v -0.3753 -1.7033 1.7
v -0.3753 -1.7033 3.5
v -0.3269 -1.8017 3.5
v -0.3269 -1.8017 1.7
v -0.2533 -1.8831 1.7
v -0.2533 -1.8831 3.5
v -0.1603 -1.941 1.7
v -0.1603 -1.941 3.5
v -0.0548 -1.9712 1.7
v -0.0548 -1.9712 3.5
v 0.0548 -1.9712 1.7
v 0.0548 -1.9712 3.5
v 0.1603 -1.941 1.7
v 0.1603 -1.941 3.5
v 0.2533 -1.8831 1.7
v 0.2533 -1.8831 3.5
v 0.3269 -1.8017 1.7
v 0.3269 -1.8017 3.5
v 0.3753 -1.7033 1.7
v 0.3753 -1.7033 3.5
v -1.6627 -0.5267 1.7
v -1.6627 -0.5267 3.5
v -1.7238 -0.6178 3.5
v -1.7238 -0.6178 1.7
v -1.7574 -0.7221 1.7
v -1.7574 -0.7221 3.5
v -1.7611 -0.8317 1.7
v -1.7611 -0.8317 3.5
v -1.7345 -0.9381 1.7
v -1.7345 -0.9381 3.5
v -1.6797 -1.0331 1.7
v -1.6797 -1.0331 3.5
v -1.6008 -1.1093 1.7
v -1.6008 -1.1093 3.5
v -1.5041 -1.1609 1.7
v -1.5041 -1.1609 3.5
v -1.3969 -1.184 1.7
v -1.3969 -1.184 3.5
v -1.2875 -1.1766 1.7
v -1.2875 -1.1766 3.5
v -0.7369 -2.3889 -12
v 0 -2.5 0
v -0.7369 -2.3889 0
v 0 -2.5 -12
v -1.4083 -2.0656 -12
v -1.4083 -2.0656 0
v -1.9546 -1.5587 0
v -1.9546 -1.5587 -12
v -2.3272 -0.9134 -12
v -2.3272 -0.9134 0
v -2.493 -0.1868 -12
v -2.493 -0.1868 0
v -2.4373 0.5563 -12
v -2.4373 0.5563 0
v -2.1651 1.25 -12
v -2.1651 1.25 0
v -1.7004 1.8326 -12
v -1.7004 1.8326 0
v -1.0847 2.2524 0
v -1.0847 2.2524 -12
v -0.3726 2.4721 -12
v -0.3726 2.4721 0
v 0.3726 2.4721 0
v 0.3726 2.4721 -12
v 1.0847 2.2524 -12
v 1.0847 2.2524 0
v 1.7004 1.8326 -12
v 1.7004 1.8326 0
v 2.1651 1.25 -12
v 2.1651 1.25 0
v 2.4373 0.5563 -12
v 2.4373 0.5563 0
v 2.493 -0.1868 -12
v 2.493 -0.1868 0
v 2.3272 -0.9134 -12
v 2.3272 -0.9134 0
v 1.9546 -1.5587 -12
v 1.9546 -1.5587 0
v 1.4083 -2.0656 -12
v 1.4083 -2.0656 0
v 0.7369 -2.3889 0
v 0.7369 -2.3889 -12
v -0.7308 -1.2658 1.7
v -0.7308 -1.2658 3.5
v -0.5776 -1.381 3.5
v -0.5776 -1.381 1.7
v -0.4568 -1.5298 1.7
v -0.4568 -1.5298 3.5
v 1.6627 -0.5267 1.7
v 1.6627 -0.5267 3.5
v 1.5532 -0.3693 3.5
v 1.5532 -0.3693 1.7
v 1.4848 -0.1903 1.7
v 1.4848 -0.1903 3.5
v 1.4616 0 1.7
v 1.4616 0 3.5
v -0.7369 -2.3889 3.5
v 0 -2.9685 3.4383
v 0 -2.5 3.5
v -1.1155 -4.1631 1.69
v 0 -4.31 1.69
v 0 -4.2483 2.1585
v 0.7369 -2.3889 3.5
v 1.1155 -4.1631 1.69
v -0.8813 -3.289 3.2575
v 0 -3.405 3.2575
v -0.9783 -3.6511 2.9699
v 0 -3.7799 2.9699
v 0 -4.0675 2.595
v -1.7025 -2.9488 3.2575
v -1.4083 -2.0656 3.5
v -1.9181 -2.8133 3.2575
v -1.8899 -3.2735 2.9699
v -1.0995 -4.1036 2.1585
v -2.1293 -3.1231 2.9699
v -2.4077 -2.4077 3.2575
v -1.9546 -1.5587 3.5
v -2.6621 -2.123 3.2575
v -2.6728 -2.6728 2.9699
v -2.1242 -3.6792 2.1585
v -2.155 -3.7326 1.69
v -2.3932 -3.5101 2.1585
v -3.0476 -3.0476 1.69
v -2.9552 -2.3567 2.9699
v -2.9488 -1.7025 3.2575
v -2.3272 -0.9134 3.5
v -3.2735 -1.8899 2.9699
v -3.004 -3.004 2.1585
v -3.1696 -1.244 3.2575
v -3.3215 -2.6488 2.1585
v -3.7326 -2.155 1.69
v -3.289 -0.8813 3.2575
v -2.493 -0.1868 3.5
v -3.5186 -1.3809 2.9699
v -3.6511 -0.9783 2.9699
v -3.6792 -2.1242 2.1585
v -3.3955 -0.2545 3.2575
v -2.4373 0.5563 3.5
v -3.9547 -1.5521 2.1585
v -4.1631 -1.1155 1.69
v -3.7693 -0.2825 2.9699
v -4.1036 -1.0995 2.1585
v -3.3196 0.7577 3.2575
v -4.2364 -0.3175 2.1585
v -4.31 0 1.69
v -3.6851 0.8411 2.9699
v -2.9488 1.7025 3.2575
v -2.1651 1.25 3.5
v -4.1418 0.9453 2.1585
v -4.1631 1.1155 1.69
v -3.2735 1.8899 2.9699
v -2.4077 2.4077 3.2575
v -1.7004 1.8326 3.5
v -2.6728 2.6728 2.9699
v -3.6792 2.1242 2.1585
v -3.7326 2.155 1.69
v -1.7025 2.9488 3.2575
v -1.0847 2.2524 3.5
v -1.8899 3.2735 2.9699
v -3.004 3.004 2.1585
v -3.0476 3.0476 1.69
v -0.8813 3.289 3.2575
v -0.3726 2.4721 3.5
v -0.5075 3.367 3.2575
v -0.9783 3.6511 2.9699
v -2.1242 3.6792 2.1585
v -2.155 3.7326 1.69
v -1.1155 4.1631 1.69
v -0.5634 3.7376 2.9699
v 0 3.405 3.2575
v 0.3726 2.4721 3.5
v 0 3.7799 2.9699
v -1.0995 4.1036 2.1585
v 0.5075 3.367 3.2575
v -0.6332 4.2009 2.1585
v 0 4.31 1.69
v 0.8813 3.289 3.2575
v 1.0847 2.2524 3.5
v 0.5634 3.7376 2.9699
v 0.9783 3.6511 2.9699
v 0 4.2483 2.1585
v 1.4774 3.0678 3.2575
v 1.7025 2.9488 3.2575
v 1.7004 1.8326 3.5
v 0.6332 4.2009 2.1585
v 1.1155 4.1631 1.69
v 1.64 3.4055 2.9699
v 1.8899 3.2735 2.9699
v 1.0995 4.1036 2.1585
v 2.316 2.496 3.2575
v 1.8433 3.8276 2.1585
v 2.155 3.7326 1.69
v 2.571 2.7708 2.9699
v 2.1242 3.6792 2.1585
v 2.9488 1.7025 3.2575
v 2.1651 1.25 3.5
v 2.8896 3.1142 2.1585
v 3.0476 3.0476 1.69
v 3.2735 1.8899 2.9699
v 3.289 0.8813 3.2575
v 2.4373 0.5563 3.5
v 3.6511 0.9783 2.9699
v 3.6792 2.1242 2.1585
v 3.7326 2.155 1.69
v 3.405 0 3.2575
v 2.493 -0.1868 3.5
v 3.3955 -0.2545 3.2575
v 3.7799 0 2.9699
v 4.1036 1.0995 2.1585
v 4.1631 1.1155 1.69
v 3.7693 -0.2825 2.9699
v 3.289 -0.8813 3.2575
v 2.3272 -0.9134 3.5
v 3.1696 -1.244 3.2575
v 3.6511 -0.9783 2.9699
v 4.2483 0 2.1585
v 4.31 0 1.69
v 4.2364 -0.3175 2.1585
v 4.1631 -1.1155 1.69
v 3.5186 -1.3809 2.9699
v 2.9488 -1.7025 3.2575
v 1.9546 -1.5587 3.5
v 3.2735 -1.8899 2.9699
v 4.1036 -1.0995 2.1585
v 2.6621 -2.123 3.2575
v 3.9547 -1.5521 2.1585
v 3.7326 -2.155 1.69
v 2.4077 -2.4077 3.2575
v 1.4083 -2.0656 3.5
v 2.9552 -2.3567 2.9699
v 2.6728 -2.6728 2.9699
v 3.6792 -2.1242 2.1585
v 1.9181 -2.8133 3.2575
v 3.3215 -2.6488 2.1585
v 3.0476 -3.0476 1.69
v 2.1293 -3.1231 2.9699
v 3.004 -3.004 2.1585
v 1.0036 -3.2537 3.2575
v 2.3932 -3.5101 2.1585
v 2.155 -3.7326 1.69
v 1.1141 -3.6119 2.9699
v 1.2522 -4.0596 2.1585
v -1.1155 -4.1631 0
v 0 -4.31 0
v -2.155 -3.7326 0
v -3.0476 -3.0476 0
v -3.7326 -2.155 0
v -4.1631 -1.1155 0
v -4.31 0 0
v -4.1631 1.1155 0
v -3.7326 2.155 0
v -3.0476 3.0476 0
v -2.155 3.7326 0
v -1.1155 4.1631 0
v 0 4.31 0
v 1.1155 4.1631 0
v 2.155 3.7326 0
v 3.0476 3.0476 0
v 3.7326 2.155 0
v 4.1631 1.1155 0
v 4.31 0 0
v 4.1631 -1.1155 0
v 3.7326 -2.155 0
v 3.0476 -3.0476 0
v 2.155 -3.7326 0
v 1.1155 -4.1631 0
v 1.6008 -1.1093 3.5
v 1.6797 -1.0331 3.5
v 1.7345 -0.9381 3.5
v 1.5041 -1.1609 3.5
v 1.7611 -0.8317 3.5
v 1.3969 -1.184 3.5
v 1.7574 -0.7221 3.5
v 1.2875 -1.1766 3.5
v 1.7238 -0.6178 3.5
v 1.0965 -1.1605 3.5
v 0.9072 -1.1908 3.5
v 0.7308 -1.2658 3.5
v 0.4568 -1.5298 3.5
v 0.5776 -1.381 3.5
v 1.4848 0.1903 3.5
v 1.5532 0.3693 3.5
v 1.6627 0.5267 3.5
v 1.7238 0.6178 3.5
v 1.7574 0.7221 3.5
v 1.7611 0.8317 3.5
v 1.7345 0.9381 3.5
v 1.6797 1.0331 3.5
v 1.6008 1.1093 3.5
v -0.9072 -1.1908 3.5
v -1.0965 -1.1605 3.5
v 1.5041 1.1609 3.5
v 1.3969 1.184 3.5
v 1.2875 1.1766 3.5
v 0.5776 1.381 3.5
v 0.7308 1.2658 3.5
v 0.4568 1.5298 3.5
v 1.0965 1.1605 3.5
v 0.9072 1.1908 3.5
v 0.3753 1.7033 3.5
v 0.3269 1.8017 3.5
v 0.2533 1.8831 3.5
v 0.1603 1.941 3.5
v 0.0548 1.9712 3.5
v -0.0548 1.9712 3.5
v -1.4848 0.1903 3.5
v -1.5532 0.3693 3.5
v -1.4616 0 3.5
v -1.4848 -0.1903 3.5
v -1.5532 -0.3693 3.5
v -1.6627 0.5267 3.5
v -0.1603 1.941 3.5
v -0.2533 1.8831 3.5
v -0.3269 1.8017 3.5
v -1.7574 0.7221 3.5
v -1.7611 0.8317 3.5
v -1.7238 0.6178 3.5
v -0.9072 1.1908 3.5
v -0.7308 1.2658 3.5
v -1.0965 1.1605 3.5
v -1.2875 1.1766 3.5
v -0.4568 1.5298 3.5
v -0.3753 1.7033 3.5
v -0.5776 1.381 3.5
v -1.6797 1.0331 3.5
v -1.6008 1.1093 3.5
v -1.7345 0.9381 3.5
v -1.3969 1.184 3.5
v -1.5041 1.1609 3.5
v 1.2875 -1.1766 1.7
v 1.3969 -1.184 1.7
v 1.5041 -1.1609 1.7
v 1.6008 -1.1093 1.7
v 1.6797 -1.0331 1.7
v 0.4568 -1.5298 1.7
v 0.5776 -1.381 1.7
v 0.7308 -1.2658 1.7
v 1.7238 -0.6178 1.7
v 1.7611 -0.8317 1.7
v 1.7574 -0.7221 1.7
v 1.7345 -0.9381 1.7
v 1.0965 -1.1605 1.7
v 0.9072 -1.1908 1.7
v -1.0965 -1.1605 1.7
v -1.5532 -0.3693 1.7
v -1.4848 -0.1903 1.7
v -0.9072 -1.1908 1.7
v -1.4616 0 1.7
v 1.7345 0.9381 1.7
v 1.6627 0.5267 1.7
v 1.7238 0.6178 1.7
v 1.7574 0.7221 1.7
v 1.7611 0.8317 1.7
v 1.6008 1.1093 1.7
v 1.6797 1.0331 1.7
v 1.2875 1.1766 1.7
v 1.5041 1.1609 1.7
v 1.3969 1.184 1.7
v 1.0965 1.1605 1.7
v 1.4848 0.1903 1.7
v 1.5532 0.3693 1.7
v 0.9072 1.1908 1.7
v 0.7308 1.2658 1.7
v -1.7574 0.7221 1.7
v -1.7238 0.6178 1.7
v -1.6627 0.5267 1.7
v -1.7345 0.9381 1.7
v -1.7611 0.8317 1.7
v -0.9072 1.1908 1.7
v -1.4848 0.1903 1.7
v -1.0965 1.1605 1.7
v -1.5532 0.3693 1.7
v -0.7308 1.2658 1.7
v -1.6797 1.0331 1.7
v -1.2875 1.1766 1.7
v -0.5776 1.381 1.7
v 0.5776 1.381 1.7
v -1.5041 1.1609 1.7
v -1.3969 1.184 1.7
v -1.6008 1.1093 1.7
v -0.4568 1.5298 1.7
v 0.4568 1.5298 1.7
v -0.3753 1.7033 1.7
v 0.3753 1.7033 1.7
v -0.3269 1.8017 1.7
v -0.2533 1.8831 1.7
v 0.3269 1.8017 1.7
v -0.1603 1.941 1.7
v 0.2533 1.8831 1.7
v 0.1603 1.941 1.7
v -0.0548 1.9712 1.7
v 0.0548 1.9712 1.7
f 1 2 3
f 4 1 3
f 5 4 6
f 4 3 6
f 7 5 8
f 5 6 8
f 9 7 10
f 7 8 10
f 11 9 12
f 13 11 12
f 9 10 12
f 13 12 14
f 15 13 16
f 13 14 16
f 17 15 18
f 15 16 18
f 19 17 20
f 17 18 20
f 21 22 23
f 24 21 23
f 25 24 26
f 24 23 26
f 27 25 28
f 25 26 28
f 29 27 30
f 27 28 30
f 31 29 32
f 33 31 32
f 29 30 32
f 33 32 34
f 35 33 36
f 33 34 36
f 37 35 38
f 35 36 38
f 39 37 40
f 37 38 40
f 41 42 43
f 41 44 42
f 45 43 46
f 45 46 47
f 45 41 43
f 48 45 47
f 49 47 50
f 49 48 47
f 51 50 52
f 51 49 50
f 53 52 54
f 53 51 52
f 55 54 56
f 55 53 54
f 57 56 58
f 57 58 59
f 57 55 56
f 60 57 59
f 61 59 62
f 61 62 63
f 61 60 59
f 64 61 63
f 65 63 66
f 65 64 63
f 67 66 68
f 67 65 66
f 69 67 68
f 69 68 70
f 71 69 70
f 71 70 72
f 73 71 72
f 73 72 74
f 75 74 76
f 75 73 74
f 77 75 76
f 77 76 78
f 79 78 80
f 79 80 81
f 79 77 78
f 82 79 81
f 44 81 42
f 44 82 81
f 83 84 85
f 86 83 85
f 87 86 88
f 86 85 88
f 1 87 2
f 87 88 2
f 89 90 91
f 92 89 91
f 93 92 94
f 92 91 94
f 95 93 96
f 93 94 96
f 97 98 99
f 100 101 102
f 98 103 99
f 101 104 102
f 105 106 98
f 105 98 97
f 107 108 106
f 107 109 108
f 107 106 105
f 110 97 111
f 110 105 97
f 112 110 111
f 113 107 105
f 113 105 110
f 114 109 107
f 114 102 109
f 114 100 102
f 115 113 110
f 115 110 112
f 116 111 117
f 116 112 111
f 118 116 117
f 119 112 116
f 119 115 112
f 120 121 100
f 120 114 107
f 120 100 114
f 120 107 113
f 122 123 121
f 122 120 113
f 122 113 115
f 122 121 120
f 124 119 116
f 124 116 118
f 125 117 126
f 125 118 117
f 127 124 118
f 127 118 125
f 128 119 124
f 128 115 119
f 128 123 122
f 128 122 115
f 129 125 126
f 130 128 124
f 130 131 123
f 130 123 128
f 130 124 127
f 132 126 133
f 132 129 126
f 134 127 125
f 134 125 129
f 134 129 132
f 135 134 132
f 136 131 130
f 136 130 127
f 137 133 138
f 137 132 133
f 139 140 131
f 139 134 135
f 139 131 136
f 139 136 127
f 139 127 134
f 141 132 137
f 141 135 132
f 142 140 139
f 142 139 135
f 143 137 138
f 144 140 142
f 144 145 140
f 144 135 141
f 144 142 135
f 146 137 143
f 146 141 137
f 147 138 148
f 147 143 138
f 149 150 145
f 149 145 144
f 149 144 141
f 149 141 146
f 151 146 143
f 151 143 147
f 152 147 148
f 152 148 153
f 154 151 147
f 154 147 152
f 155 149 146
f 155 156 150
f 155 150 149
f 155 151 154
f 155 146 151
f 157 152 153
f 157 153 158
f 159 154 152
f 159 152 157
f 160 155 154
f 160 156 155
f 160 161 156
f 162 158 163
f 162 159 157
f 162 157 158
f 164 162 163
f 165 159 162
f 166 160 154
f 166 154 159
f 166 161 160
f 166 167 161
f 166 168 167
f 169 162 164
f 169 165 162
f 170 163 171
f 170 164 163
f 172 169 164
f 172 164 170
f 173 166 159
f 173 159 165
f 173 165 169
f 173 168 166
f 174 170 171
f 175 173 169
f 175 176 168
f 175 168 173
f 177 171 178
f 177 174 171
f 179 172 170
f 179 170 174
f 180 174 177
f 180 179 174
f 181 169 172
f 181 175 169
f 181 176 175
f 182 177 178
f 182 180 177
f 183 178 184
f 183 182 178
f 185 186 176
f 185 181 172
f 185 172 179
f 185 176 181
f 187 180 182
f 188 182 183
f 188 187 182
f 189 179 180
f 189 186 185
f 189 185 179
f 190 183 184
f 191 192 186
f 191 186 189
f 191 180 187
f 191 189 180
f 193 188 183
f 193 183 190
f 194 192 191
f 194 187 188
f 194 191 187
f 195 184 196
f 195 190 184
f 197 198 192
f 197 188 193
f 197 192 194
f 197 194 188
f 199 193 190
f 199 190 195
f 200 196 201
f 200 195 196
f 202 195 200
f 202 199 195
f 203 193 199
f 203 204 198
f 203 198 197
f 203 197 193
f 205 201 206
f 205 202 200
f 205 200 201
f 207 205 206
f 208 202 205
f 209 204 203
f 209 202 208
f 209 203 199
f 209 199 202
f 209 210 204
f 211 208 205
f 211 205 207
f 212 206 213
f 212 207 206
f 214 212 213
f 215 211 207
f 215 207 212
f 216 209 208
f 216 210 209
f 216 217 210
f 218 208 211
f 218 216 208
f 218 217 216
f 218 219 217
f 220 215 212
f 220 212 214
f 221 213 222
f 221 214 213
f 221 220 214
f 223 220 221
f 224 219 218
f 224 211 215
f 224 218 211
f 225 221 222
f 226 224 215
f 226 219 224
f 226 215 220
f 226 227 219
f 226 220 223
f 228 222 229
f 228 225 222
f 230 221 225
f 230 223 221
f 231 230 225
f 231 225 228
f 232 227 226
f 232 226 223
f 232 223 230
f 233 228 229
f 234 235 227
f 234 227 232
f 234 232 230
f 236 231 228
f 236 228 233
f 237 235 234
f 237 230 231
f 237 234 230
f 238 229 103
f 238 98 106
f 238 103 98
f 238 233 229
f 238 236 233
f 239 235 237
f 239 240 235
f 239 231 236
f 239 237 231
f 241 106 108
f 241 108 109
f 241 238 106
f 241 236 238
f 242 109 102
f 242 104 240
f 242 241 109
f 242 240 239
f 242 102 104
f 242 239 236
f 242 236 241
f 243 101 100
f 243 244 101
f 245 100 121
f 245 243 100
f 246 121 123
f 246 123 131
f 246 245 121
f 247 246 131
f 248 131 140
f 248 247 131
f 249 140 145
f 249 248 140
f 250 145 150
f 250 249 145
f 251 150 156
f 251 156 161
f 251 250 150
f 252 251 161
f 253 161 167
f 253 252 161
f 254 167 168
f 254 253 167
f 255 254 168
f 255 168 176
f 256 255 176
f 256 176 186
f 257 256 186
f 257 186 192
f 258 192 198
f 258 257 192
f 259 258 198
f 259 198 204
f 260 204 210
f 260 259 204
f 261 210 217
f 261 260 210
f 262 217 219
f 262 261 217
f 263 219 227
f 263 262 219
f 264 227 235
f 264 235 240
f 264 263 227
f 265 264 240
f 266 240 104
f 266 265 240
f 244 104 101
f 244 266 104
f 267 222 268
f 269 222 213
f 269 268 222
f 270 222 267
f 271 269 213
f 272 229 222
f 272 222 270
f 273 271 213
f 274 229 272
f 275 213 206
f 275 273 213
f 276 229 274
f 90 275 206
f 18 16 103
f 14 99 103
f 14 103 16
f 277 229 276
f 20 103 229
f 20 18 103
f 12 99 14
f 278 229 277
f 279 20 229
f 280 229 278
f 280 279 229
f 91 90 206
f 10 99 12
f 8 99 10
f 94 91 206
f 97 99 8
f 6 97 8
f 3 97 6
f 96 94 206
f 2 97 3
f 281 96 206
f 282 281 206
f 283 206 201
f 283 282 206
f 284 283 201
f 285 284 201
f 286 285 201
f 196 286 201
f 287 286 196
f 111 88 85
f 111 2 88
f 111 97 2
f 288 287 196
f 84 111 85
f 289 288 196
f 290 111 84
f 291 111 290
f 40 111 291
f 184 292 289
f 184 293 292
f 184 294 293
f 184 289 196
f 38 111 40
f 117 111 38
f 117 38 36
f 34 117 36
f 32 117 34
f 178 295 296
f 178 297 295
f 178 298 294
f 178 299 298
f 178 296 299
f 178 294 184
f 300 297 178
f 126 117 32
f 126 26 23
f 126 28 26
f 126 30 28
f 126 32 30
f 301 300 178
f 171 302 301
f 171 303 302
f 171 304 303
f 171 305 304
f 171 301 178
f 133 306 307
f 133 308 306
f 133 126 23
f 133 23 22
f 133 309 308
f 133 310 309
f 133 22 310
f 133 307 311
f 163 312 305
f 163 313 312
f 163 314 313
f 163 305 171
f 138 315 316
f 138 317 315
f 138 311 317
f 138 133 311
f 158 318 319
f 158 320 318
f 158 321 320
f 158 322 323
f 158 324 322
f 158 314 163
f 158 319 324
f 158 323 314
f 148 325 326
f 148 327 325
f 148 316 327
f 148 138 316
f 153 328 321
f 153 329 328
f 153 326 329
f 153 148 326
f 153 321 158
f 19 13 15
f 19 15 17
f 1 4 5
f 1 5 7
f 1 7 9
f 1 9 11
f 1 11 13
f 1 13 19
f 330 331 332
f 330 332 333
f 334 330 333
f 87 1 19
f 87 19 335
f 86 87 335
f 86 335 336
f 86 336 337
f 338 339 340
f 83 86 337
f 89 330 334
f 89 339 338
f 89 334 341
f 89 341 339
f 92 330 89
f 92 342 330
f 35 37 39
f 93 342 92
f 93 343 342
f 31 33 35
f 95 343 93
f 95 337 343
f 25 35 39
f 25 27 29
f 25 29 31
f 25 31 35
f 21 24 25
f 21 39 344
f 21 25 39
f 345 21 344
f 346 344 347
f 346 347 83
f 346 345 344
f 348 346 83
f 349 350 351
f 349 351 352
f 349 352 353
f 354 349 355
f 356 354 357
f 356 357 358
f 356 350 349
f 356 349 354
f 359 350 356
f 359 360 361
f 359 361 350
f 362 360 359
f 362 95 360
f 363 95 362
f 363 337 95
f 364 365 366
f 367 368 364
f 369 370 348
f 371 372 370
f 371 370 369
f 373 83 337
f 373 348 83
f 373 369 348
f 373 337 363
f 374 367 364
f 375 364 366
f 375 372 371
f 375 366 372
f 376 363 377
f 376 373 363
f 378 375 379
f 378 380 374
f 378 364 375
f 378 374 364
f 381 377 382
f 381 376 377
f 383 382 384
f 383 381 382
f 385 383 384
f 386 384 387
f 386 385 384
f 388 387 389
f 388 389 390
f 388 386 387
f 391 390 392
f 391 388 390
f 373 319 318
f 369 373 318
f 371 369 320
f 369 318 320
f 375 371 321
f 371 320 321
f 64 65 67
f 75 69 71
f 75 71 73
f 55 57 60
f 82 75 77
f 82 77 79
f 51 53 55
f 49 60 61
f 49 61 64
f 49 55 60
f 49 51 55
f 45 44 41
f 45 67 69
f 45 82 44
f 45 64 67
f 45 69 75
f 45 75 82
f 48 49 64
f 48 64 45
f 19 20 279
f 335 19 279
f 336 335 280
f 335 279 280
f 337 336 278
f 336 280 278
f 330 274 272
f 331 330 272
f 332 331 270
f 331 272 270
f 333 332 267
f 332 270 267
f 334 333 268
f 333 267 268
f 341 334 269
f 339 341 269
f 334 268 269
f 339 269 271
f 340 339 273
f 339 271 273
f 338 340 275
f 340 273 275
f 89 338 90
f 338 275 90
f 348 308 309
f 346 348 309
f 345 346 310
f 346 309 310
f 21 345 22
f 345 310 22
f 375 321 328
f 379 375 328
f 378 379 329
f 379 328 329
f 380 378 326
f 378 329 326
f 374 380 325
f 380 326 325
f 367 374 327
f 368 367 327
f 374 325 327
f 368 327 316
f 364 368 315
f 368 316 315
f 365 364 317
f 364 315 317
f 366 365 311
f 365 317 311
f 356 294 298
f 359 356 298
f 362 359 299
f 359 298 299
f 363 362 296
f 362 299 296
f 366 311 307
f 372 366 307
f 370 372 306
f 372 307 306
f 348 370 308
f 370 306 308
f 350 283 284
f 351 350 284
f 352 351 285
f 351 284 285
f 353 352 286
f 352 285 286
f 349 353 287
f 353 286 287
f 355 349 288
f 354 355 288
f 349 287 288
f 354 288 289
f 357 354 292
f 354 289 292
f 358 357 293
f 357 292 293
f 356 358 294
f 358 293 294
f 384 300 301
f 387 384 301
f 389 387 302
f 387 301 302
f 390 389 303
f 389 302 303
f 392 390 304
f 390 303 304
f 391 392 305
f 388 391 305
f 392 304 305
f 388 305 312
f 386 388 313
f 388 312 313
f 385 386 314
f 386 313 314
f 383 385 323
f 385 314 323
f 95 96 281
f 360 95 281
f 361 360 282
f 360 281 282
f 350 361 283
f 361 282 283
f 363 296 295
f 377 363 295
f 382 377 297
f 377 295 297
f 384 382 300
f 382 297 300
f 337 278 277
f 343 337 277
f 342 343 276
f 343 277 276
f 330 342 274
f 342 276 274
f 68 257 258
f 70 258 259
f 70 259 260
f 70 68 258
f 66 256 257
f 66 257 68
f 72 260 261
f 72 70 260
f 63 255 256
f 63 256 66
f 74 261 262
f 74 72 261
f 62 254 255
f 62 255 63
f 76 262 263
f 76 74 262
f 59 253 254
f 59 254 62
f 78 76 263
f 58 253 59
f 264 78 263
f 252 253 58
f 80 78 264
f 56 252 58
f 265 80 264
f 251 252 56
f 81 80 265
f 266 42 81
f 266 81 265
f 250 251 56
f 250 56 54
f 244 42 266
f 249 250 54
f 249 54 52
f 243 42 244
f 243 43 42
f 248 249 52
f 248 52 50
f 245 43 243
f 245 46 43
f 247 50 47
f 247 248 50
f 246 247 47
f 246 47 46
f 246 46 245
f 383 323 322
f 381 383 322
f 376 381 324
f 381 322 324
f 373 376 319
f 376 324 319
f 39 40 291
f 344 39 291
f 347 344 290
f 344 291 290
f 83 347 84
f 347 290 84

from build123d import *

# Parameters (mm, degrees)
CUT_EXTRUDE1_DEPTH = 1.8
CIRPATTERN1_COUNT  = 6


with BuildPart() as part:
    # Sketch1 → Revolve1 (revolve)
    with BuildSketch(Plane(origin=(0, 0, 0), x_dir=(0, 0, -1), z_dir=(1, 0, 0))):
        with BuildLine():
            Line((-3.5, 0), (-3.5, 2.5))
            ThreePointArc((-3.5, 2.5), (-2.969863274, 3.779863274), (-1.69, 4.31))
            Line((-1.69, 4.31), (0, 4.31))
            Line((0, 4.31), (0, 2.5))
            Line((0, 2.5), (12, 2.5))
            Line((12, 2.5), (12, 0))
            Line((12, 0), (-3.5, 0))
        make_face()
    revolve(axis=Axis((0, 0, 5.584882278), (0, 0, -1)))

    # Sketch2 → Cut-Extrude1 (cut)
    with BuildSketch(Plane.XY.offset(3.5)):
        with BuildLine():
            Line((-0.730783495, 1.265754142), (0, 0))
            Line((0, 0), (0.730783495, 1.265754142))
            ThreePointArc((0.730783495, 1.265754142), (0.512661987, 1.451735511), (0.375261165, 1.703304737))
            ThreePointArc((0.375261165, 1.703304737), (0, 1.975), (-0.375261165, 1.703304737))
            ThreePointArc((-0.375261165, 1.703304737), (-0.512661987, 1.451735511), (-0.730783495, 1.265754142))
        make_face()
    cut_extrude1 = extrude(amount=-CUT_EXTRUDE1_DEPTH, mode=Mode.SUBTRACT)

    # CirPattern1: Cut-Extrude1 ×6 about axis
    cirpattern1_axis = Axis((0, 0, 5.584882278), (0, 0, 1))
    for i in range(1, CIRPATTERN1_COUNT):
        add(cut_extrude1.rotate(cirpattern1_axis, i * 360 / CIRPATTERN1_COUNT), mode=Mode.SUBTRACT)


solid = part.part
